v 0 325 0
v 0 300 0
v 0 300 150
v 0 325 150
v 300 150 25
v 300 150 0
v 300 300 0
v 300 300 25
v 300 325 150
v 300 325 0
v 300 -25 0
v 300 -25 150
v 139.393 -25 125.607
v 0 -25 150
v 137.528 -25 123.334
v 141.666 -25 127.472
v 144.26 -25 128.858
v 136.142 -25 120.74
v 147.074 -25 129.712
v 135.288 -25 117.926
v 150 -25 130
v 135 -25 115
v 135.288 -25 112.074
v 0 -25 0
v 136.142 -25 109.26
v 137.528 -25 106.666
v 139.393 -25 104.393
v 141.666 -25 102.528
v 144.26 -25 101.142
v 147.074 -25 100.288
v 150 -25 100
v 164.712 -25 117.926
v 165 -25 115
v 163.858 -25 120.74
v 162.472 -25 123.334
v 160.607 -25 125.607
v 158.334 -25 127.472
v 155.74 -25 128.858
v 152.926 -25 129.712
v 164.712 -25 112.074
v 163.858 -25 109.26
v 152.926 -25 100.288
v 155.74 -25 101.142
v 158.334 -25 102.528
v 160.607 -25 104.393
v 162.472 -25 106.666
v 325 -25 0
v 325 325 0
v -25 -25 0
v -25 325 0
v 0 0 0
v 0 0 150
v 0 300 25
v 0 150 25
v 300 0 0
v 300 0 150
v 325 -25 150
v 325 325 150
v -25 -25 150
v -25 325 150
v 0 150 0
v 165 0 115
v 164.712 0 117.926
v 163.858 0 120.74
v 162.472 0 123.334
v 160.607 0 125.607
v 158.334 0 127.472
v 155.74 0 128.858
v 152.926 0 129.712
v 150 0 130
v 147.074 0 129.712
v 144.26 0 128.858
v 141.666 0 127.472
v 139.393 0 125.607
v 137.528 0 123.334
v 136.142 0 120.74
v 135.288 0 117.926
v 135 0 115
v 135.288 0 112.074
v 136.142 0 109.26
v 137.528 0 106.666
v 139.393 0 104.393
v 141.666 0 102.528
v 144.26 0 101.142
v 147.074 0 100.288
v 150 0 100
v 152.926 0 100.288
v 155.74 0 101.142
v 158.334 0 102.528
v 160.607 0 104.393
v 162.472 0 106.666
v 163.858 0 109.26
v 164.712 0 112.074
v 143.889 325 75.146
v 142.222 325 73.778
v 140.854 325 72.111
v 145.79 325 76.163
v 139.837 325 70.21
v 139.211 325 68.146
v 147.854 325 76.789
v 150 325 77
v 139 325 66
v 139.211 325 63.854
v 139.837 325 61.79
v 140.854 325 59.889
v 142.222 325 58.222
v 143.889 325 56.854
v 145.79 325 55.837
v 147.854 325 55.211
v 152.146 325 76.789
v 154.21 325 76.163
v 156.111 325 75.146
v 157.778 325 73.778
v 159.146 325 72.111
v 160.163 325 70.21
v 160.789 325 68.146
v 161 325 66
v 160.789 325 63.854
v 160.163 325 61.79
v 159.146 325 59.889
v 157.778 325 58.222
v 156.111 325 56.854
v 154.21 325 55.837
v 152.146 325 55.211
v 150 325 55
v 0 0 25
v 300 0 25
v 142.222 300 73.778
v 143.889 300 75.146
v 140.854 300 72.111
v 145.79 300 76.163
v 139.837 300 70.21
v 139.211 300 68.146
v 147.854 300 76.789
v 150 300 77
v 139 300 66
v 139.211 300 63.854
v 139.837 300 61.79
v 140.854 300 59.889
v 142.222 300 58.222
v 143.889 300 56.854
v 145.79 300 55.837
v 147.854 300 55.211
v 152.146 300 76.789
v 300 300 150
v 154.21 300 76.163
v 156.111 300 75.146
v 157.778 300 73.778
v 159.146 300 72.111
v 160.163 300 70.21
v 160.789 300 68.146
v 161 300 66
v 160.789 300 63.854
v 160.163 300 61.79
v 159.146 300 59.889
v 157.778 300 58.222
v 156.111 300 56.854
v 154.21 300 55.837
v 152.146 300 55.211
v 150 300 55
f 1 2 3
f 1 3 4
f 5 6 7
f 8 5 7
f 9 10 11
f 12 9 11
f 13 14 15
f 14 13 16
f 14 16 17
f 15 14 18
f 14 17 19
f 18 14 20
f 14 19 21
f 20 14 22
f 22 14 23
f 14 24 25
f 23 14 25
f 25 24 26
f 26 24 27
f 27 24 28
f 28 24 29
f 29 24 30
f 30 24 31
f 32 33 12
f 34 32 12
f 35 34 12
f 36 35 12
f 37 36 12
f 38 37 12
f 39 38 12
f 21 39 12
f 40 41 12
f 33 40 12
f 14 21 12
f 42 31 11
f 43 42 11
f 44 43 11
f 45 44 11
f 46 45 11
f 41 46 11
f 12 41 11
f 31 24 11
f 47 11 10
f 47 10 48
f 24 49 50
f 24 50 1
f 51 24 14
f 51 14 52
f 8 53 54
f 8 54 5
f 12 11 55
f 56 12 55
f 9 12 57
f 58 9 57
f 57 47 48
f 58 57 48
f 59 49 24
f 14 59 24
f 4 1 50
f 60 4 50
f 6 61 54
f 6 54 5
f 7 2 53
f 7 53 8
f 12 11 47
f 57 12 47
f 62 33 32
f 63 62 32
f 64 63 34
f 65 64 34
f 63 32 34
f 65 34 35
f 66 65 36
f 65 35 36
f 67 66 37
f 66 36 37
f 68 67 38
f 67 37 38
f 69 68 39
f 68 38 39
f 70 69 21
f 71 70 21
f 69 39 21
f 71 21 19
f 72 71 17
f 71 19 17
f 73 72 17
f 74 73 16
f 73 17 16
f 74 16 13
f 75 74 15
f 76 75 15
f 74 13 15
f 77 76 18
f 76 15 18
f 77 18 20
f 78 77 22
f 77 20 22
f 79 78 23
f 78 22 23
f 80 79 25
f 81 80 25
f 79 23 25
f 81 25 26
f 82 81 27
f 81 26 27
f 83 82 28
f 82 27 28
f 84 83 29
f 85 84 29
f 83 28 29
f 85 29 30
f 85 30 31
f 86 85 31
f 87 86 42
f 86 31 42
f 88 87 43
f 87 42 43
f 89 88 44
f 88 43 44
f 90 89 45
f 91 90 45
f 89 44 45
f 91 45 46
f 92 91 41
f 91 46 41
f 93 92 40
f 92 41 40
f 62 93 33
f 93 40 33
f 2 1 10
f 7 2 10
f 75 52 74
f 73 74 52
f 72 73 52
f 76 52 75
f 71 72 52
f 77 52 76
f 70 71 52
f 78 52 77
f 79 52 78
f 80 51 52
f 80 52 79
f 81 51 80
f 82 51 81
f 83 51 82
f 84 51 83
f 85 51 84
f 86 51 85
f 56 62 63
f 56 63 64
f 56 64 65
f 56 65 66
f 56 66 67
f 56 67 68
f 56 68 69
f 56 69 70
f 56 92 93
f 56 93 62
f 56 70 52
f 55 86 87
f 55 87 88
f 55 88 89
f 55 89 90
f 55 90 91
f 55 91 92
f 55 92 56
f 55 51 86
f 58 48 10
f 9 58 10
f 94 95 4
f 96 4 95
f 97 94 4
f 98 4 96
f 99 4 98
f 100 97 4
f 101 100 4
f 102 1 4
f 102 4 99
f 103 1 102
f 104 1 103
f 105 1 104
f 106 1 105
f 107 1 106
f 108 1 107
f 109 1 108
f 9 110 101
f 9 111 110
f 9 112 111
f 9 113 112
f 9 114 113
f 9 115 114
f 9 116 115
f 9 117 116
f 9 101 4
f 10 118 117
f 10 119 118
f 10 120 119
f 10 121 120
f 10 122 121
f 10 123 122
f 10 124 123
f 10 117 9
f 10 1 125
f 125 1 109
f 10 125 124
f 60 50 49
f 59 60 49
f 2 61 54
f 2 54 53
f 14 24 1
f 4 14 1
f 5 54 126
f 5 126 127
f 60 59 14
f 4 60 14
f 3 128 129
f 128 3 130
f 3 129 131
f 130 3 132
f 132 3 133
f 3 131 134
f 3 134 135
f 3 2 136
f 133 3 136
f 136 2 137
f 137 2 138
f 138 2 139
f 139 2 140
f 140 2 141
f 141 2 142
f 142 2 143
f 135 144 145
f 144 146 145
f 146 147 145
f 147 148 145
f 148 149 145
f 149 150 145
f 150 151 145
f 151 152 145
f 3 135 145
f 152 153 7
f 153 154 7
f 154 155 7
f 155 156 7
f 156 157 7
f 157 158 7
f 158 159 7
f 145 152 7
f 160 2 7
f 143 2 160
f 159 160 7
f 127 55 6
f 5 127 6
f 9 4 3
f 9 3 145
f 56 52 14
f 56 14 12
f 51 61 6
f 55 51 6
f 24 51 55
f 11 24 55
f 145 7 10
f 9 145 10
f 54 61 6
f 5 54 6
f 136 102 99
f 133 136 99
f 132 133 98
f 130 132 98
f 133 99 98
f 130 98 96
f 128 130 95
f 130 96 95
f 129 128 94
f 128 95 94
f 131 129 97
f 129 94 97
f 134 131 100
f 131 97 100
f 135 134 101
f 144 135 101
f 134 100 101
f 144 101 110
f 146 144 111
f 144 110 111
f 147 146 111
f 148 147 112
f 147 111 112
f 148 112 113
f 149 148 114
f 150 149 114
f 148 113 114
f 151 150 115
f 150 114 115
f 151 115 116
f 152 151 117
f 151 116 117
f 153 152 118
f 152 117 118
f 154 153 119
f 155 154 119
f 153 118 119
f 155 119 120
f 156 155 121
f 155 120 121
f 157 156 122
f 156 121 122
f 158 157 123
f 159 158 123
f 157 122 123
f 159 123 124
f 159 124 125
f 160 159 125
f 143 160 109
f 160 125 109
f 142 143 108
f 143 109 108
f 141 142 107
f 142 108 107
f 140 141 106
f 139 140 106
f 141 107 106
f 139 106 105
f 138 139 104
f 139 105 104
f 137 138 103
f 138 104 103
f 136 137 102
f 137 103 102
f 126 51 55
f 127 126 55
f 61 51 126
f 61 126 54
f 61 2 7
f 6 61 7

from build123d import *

# Parameters (mm, degrees)
F0_W     = 300
F0_H     = 150
F1_DEPTH = 25
F2_DEPTH = 25
F0_H_2   = 25
F3_DEPTH = 150
F4_DEPTH = 150
F6_DEPTH = 25
F7_R     = 15
F8_DEPTH = 25


with BuildPart() as f1:
    # F0 (on Top) → F1 (new body)
    with BuildSketch(Plane.XY):
        with Locations((150, 75)):
            Rectangle(F0_W, F0_H)
    extrude(amount=F1_DEPTH)


with BuildPart() as f2:
    # F0 (on Top) → F2 (new body)
    with BuildSketch(Plane.XY):
        with Locations((150, 225)):
            Rectangle(F0_W, F0_H)
    extrude(amount=F2_DEPTH)


with BuildPart() as f3:
    # F0 (on Top) → F3 (new body)
    with BuildSketch(Plane.XY):
        with Locations((150, 312.5)):
            Rectangle(F0_W, F0_H_2)
        with Locations((150, -12.5)):
            Rectangle(F0_W, F0_H_2)
    extrude(amount=F3_DEPTH)

    # F5 (on face) → F6 (cut, through all)
    with BuildSketch(Plane(origin=(0, 325, 0), x_dir=(-1, 0, 0), z_dir=(0, 1, 0))):
        with BuildLine():
            ThreePointArc((-161, 66), (-150, 55), (-139, 66))
            Line((-139, 66), (-161, 66))
        make_face()
        with BuildLine():
            Line((-161, 66), (-139, 66))
            ThreePointArc((-139, 66), (-150, 77), (-161, 66))
        make_face()
    extrude(amount=-F6_DEPTH, mode=Mode.SUBTRACT)

    # F7 (on face) → F8 (cut, through all)
    with BuildSketch(Plane.XZ.offset(25)):
        with Locations((150, 115)):
            Circle(F7_R)
    extrude(amount=-F8_DEPTH, mode=Mode.SUBTRACT)


with BuildPart() as f4:
    # F0 (on Top) → F4 (new body)
    with BuildSketch(Plane.XY):
        Polygon((300, 150), (300, 0), (300, -25), (325, -25), (325, 325), (300, 325), (300, 300), align=None)
        Polygon((0, -25), (0, 0), (0, 150), (0, 300), (0, 325), (-25, 325), (-25, -25), align=None)
    extrude(amount=F4_DEPTH)


solid = Compound([f1.part, f2.part, f3.part, f4.part])
